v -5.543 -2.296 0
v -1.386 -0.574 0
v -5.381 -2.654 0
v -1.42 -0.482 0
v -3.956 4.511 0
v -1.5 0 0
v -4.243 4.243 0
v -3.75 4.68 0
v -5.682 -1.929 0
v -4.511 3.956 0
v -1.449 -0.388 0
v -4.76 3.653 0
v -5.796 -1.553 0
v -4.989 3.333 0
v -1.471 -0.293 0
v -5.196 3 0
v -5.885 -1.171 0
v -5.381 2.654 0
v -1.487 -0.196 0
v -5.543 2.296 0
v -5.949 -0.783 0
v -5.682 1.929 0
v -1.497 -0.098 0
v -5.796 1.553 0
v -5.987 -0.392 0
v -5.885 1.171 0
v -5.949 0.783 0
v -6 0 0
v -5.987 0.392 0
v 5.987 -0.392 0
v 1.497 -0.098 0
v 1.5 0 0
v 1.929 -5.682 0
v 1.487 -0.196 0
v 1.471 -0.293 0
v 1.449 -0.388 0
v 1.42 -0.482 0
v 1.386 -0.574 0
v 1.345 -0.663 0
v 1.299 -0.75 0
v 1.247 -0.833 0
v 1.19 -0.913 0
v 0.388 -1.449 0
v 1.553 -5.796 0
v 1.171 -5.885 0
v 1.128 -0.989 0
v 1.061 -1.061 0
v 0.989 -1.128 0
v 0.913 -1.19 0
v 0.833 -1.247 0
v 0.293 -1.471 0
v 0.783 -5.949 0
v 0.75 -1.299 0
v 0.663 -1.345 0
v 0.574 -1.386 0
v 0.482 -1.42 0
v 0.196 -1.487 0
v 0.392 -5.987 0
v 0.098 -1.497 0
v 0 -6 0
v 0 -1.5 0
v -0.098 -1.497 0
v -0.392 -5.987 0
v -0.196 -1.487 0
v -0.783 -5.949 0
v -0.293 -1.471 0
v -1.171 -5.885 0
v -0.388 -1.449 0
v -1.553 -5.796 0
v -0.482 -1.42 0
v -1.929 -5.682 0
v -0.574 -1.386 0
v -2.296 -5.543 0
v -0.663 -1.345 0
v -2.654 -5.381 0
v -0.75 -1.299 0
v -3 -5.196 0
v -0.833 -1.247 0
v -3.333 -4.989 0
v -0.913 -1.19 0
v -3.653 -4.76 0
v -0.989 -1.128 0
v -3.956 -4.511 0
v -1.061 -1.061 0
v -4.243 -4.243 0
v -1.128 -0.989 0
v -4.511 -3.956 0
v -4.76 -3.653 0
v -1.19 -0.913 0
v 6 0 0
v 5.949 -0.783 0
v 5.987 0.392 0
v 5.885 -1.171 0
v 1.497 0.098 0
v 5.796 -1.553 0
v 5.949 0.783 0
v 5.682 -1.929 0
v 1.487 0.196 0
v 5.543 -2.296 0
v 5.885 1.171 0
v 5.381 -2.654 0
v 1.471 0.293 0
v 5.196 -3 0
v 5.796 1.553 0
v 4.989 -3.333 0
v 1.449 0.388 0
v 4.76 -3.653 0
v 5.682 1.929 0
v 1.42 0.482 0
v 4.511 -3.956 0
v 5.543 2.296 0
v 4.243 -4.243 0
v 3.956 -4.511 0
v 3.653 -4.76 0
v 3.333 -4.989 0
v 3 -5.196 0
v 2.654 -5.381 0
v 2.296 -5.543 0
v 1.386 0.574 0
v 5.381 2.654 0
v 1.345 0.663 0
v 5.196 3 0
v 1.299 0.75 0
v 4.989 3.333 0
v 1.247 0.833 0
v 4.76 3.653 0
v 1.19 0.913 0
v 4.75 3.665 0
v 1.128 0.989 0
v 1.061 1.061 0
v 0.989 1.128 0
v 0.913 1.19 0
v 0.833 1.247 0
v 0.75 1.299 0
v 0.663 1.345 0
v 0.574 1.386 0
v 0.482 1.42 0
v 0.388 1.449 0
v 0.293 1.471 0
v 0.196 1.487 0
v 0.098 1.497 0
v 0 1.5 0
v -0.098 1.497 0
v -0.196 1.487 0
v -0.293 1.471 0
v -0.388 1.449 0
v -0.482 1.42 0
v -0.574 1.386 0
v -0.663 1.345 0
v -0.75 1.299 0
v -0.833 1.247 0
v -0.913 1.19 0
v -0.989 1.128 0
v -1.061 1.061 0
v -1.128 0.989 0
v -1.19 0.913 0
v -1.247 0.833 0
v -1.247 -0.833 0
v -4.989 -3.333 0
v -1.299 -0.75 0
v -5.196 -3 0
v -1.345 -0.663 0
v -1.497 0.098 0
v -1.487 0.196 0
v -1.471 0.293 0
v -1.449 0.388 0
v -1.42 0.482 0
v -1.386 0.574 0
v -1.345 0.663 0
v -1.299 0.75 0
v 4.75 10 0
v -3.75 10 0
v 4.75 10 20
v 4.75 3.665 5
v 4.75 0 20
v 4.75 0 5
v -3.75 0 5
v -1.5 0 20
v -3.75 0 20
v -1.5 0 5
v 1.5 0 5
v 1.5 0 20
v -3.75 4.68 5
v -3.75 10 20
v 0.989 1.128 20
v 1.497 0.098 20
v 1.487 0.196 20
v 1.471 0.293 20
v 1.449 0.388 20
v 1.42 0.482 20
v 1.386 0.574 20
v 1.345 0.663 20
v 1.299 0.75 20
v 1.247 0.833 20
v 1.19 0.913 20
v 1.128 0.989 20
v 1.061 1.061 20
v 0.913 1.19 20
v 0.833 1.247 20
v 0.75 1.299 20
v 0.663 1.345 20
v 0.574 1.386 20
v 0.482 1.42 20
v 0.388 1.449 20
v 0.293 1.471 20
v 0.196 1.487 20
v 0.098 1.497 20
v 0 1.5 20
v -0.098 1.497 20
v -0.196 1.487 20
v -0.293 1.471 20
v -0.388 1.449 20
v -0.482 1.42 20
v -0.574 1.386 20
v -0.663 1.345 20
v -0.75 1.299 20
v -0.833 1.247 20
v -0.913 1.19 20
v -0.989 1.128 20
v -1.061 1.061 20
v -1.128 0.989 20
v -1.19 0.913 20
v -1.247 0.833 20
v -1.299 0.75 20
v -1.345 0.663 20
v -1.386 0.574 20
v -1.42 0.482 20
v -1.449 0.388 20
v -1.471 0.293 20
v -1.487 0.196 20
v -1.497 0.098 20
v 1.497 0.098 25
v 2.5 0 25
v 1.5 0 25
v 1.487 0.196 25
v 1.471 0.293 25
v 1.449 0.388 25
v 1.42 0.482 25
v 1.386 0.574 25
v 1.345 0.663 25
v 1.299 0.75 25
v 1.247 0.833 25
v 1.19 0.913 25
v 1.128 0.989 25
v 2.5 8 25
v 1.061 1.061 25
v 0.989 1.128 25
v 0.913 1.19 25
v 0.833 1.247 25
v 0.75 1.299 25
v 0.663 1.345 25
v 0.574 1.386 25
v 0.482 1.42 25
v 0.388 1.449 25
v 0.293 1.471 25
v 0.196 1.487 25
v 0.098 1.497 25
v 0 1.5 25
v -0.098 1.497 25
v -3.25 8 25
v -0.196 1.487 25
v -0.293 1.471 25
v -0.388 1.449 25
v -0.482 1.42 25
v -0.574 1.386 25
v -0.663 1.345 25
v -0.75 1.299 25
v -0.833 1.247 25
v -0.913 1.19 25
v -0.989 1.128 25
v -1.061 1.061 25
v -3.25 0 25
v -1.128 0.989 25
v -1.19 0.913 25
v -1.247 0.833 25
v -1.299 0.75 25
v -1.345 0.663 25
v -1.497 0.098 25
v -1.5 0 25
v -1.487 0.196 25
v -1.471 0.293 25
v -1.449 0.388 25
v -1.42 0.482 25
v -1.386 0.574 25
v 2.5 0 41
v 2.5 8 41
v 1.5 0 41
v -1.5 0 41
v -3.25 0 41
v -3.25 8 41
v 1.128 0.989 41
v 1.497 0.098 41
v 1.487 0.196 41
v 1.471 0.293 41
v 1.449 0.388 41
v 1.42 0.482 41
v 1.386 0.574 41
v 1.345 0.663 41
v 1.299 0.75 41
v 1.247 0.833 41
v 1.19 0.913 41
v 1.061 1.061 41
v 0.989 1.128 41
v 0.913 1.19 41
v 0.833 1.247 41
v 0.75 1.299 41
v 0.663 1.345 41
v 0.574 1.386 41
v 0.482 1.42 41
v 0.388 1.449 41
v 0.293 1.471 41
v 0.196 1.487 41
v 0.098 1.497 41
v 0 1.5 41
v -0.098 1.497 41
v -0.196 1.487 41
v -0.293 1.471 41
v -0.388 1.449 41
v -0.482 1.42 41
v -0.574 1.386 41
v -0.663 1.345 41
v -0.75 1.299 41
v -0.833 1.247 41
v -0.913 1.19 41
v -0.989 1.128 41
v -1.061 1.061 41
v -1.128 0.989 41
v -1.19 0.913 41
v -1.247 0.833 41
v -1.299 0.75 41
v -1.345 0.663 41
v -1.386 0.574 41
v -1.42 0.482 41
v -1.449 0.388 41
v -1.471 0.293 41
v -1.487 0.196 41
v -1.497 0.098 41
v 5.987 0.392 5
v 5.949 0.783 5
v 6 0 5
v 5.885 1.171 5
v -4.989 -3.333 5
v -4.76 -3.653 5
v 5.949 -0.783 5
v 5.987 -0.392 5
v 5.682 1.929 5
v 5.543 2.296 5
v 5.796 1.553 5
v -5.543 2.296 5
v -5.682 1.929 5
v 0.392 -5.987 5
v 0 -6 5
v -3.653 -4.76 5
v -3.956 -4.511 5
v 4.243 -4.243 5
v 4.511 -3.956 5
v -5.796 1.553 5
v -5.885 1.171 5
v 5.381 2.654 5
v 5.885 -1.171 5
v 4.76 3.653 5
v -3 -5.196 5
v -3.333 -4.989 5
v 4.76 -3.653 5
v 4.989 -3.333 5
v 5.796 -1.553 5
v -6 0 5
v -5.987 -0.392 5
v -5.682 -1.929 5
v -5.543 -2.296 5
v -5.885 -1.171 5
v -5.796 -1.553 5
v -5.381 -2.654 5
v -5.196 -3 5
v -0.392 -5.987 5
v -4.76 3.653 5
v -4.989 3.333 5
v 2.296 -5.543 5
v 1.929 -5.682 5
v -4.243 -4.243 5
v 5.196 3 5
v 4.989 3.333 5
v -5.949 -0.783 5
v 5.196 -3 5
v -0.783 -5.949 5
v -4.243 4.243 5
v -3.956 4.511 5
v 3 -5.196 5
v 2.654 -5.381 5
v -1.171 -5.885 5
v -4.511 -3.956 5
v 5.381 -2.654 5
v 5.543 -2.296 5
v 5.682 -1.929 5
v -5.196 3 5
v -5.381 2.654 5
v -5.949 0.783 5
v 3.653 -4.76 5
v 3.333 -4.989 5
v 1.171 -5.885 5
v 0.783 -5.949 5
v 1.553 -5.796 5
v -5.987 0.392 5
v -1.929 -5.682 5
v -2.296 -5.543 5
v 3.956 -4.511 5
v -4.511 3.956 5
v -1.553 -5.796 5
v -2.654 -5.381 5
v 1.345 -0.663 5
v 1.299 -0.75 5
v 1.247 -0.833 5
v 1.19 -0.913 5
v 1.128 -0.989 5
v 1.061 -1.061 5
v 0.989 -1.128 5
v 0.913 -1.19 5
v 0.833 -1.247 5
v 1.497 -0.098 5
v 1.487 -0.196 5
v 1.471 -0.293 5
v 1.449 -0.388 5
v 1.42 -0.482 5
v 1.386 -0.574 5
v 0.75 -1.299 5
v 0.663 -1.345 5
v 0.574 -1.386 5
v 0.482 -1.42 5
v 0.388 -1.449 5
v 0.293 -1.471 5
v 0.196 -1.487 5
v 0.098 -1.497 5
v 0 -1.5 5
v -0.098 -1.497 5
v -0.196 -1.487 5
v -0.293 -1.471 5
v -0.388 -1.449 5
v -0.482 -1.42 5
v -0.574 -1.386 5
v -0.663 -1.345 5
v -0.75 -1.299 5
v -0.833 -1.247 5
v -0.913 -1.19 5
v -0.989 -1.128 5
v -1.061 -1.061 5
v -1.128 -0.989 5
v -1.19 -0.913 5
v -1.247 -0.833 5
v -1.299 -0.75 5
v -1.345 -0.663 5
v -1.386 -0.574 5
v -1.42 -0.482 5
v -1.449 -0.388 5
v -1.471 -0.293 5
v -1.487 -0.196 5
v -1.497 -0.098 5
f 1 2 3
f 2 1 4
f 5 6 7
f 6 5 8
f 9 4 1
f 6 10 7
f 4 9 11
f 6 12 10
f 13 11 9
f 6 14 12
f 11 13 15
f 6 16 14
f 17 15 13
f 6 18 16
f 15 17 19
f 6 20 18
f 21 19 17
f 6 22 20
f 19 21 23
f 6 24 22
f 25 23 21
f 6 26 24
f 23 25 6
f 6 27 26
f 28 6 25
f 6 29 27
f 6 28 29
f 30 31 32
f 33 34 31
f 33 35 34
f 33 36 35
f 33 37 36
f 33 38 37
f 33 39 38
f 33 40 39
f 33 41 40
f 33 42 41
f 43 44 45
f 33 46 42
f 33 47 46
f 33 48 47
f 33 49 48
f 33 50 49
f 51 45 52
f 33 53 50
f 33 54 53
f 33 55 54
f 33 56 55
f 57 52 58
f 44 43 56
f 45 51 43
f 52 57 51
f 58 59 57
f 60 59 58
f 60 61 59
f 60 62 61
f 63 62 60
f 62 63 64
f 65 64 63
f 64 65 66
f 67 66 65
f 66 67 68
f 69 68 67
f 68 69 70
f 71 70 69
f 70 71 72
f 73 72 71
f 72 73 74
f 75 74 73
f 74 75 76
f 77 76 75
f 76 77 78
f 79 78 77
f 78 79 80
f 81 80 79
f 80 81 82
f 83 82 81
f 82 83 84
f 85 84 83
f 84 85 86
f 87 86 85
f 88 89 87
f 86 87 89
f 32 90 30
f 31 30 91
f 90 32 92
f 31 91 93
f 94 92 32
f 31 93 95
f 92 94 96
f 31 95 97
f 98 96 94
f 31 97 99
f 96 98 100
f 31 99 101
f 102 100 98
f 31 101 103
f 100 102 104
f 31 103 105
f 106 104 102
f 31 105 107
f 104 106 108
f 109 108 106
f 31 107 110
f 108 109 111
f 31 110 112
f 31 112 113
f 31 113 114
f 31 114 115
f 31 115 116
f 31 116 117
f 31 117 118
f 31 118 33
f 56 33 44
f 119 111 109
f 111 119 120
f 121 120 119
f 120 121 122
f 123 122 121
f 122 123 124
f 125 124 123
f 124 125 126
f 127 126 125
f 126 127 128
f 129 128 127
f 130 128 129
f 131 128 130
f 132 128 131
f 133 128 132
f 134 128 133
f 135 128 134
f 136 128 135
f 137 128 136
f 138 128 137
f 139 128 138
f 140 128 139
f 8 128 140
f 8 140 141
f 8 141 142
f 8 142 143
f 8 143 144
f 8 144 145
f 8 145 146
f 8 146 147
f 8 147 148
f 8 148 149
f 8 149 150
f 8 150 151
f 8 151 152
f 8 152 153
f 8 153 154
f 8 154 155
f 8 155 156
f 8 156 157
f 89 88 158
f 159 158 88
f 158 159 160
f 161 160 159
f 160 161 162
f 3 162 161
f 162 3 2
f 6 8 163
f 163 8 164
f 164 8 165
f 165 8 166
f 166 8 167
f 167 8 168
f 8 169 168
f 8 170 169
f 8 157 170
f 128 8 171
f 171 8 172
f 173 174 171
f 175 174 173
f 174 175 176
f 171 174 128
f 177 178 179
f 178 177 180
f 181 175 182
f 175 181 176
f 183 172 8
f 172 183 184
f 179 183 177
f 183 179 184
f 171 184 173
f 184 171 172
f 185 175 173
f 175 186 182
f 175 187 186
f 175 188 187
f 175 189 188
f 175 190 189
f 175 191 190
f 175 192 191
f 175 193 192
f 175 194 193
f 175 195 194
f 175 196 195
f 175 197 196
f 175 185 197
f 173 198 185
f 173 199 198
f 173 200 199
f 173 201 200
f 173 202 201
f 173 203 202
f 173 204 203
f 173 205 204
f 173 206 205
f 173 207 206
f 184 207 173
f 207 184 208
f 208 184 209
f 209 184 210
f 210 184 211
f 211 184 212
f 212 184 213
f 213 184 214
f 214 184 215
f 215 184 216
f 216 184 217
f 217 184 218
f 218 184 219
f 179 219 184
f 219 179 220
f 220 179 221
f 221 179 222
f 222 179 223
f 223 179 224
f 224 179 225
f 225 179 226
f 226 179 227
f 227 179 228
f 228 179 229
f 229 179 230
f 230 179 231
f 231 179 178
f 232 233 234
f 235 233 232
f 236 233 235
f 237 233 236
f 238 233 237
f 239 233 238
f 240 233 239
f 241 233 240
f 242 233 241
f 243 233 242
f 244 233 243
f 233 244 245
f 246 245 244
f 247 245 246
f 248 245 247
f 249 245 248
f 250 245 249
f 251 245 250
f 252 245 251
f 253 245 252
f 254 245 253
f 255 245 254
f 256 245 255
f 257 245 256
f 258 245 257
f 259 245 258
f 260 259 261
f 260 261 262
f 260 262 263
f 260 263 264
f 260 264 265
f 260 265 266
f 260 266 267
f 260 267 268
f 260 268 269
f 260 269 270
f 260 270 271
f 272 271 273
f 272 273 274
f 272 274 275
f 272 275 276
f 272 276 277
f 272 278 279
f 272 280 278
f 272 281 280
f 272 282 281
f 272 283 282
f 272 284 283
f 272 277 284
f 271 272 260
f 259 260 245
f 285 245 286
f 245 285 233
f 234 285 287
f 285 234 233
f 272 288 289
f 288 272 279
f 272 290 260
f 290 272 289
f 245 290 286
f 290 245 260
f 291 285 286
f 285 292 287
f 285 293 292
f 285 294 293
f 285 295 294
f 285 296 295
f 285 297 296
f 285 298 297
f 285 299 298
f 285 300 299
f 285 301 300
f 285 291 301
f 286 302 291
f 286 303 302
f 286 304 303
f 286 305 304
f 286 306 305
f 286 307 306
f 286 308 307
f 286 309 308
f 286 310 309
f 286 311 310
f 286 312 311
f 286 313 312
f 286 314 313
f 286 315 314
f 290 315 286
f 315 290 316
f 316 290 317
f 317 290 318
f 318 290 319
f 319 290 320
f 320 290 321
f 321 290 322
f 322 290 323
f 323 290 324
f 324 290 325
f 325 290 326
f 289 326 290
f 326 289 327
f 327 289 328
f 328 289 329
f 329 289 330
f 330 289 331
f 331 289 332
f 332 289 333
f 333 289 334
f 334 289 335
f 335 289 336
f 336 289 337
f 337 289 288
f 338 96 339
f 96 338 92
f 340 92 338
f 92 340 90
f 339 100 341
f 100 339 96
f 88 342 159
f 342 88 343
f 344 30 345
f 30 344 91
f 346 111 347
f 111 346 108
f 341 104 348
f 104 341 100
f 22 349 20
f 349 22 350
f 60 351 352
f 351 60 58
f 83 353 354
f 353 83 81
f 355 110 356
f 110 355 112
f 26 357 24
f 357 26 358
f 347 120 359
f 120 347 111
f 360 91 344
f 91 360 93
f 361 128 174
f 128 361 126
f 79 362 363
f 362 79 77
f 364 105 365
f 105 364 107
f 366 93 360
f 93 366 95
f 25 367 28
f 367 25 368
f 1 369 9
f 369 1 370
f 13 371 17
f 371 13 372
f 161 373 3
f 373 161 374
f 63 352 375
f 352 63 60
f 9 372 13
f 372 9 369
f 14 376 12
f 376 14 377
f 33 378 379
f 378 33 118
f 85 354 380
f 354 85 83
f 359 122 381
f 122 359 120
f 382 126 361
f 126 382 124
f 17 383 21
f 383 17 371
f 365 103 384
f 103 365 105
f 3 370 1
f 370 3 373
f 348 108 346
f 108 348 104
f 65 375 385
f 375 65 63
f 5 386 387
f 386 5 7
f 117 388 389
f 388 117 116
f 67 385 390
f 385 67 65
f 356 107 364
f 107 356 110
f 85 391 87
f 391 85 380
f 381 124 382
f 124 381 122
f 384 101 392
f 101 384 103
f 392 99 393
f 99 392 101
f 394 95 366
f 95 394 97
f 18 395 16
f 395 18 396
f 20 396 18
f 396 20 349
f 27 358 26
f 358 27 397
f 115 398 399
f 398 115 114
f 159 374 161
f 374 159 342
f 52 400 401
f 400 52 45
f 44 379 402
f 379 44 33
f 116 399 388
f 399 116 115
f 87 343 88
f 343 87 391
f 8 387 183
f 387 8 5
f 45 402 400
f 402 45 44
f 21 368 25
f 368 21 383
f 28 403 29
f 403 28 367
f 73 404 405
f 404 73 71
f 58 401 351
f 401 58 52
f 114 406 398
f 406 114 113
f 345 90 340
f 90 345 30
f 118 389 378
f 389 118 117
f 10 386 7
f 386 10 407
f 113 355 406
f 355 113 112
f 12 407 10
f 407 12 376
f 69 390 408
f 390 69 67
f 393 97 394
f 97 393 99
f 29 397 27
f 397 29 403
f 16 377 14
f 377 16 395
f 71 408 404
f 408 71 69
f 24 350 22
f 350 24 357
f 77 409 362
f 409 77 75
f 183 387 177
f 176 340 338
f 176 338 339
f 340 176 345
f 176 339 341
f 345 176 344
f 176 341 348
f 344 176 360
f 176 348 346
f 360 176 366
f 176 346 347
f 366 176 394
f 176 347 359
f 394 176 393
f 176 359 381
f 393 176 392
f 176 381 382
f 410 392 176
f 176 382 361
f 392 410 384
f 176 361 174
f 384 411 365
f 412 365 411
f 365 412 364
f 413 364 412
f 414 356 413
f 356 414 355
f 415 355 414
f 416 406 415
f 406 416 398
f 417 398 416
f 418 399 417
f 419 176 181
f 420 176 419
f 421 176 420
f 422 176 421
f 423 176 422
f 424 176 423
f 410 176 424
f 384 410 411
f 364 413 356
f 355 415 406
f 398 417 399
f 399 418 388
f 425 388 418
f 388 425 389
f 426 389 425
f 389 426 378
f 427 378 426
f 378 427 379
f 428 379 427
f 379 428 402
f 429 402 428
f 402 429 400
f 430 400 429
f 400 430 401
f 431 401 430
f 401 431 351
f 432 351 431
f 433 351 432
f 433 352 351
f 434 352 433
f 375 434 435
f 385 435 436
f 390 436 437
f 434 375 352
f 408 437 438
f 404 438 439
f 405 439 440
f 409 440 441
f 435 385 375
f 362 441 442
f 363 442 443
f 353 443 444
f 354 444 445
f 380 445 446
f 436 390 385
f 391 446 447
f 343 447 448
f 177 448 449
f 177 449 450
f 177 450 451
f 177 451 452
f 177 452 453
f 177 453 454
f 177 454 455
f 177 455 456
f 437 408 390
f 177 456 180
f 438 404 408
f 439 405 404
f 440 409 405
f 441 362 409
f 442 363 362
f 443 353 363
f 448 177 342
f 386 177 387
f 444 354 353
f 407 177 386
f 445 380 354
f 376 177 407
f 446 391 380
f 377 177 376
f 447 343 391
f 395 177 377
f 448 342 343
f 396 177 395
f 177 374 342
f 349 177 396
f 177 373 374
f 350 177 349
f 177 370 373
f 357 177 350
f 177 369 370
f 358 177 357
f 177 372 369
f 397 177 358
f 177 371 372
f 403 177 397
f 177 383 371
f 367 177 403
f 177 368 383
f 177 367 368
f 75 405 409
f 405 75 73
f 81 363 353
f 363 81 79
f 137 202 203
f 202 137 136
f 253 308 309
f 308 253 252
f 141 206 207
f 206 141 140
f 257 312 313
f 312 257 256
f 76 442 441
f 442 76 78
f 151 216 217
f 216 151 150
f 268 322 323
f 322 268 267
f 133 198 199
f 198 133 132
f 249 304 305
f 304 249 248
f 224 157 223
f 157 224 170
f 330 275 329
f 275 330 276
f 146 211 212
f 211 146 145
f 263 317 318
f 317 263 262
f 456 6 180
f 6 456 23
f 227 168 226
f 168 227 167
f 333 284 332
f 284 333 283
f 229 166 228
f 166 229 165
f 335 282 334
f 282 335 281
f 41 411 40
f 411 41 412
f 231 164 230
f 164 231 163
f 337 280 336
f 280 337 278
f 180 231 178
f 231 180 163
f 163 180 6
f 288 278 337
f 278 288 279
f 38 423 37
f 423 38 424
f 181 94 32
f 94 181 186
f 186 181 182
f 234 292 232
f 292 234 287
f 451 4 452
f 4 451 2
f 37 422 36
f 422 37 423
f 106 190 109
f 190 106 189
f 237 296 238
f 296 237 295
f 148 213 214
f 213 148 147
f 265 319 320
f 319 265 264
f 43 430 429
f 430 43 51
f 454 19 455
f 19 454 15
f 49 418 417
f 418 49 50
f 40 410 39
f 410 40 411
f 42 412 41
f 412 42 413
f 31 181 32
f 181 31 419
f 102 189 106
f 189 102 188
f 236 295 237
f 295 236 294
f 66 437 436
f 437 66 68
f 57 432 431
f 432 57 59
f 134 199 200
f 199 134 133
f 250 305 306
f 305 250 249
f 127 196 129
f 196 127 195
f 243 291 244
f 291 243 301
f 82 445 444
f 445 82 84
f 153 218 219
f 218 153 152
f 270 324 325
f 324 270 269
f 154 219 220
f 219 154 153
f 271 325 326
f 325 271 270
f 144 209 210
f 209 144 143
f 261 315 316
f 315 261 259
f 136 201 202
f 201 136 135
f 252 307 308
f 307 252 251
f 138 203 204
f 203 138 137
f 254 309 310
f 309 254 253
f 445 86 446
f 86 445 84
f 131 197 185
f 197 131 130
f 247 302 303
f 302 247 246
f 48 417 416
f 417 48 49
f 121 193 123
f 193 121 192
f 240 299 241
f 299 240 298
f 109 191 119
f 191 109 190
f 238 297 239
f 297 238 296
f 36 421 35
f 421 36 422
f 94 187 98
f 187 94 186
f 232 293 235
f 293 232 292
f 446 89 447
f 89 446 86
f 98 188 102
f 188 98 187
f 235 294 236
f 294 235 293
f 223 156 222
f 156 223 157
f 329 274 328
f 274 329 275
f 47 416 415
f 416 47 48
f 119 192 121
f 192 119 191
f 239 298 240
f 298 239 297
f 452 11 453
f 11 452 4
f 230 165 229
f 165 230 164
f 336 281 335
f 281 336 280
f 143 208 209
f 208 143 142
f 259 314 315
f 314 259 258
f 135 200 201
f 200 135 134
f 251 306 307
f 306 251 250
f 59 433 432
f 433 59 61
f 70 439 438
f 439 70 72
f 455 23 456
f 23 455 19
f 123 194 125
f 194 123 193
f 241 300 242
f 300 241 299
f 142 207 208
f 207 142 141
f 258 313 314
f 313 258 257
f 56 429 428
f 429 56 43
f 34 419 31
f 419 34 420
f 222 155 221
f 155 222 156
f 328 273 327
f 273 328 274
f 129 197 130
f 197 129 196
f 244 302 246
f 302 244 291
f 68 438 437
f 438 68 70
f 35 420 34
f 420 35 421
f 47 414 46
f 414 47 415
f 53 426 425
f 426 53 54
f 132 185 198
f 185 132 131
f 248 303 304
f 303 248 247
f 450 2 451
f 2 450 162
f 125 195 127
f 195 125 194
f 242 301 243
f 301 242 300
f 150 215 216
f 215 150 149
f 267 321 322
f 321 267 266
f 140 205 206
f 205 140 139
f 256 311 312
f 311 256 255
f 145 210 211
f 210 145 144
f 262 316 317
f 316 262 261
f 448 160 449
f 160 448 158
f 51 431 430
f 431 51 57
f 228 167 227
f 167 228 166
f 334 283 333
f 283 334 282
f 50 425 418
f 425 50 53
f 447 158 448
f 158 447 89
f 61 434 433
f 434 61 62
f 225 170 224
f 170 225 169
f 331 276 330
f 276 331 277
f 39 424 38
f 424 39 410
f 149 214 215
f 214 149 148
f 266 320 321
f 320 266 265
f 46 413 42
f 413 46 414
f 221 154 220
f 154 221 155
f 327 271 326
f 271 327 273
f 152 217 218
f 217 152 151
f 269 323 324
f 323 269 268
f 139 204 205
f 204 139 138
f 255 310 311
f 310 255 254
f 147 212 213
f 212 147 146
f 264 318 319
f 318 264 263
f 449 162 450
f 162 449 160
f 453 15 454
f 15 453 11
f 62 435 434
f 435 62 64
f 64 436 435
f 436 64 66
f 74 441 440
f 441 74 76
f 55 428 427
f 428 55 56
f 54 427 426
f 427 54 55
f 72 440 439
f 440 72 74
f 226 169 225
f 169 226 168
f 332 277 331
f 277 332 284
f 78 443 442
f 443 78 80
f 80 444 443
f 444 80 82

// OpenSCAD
// Straight hose-barb reducer: 8 mm ID tubing (barbs) to 5 mm ID tubing (barbs)
// Print orientation: standing upright along Z, centred on origin in X/Y

$fn = 96;

// ---- Dimensions (mm) ----
t8_id      = 8;    // inner diameter of 8 mm tubing
t5_id      = 5;    // inner diameter of 5 mm tubing
bore       = 3;    // through-bore diameter
z8_base    = 0;    // bottom of 8 mm barbs
z8_top     = 20;   // top of 8 mm barbs / bottom of collar
zcollar    = 25;   // top of collar / bottom of 5 mm barbs
z5_top     = 41;   // top of 5 mm barbs
eps        = 0.5;  // cutter overshoot

// ---- 8 mm barbs ----
n_barbs    = 2;    // stacked barbs
d8_bottom  = 7.5;  // outer diameter at bottom of barb
d8_top     = 9.5;  // outer diameter at top of barb
h8         = 10;   // barb height

// ---- Collar ----
dcollar    = 12;   // collar diameter

// ---- 5 mm barbs ----
d5_bottom  = 6.5;  // outer diameter at bottom of barb
d5_top     = 5.0;  // outer diameter at top of barb
h5         = 8;    // barb height

// ---- Model ----
difference() {
    union() {
        // 8 mm barbs
        for (i = [0 : n_barbs - 1])
            translate([0, 0, z8_base + i * h8])
                linear_extrude(height = h8)
                    polygon([
                        [-d8_bottom / 2, 0],
                        [ d8_top / 2, 0],
                        [ d8_top / 2, h8],
                        [-d8_bottom / 2, h8]
                    ]);

        // Collar
        cylinder(d = dcollar, h = zcollar - z8_top);

        // 5 mm barbs
        for (i = [0 : n_barbs - 1])
            translate([0, 0, zcollar + i * h5])
                linear_extrude(height = h5)
                    polygon([
                        [-d5_bottom / 2, 0],
                        [ d5_top / 2, 0],
                        [ d5_top / 2, h5],
                        [-d5_bottom / 2, h5]
                    ]);
    }

    // Through bore
    translate([0, 0, -eps])
        cylinder(d = bore, h = z5_top + 2 * eps);
}
